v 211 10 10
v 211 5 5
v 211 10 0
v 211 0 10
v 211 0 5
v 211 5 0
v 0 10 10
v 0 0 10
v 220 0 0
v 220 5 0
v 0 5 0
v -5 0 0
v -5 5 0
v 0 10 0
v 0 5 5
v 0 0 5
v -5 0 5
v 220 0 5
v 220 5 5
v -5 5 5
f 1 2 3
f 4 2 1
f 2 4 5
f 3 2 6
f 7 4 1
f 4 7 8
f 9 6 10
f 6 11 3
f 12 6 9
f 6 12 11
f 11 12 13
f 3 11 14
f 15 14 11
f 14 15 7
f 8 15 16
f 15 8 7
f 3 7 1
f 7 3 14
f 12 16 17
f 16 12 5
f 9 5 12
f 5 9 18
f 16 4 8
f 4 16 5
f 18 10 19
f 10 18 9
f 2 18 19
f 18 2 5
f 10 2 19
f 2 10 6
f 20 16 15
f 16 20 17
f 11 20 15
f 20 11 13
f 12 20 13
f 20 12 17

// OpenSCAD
// file: parts/beam.scad
module beam(len = 211) { cube([len, 10, 10]); }
module rail(len = undef) { assert(len != undef, "len required"); cube([len, 5, 5]); }
beam(len = 211);
module post(h = 88.9) { cube([18, 18, h]); }   // numeric default, but every caller passes h
post(h = 2 * 44.45);
// nas_post shape (server_rack v4): side = +/-1 is a mirror sign, not a dimension
module post2(side = 1) { mirror([side < 0 ? 1 : 0, 0, 0]) cube(5); }
post2();
// main file
use <parts/beam.scad>
span = 240; sx = -1;
beam(len = 211);
rail(len = span - 20);
post2(side = sx);
